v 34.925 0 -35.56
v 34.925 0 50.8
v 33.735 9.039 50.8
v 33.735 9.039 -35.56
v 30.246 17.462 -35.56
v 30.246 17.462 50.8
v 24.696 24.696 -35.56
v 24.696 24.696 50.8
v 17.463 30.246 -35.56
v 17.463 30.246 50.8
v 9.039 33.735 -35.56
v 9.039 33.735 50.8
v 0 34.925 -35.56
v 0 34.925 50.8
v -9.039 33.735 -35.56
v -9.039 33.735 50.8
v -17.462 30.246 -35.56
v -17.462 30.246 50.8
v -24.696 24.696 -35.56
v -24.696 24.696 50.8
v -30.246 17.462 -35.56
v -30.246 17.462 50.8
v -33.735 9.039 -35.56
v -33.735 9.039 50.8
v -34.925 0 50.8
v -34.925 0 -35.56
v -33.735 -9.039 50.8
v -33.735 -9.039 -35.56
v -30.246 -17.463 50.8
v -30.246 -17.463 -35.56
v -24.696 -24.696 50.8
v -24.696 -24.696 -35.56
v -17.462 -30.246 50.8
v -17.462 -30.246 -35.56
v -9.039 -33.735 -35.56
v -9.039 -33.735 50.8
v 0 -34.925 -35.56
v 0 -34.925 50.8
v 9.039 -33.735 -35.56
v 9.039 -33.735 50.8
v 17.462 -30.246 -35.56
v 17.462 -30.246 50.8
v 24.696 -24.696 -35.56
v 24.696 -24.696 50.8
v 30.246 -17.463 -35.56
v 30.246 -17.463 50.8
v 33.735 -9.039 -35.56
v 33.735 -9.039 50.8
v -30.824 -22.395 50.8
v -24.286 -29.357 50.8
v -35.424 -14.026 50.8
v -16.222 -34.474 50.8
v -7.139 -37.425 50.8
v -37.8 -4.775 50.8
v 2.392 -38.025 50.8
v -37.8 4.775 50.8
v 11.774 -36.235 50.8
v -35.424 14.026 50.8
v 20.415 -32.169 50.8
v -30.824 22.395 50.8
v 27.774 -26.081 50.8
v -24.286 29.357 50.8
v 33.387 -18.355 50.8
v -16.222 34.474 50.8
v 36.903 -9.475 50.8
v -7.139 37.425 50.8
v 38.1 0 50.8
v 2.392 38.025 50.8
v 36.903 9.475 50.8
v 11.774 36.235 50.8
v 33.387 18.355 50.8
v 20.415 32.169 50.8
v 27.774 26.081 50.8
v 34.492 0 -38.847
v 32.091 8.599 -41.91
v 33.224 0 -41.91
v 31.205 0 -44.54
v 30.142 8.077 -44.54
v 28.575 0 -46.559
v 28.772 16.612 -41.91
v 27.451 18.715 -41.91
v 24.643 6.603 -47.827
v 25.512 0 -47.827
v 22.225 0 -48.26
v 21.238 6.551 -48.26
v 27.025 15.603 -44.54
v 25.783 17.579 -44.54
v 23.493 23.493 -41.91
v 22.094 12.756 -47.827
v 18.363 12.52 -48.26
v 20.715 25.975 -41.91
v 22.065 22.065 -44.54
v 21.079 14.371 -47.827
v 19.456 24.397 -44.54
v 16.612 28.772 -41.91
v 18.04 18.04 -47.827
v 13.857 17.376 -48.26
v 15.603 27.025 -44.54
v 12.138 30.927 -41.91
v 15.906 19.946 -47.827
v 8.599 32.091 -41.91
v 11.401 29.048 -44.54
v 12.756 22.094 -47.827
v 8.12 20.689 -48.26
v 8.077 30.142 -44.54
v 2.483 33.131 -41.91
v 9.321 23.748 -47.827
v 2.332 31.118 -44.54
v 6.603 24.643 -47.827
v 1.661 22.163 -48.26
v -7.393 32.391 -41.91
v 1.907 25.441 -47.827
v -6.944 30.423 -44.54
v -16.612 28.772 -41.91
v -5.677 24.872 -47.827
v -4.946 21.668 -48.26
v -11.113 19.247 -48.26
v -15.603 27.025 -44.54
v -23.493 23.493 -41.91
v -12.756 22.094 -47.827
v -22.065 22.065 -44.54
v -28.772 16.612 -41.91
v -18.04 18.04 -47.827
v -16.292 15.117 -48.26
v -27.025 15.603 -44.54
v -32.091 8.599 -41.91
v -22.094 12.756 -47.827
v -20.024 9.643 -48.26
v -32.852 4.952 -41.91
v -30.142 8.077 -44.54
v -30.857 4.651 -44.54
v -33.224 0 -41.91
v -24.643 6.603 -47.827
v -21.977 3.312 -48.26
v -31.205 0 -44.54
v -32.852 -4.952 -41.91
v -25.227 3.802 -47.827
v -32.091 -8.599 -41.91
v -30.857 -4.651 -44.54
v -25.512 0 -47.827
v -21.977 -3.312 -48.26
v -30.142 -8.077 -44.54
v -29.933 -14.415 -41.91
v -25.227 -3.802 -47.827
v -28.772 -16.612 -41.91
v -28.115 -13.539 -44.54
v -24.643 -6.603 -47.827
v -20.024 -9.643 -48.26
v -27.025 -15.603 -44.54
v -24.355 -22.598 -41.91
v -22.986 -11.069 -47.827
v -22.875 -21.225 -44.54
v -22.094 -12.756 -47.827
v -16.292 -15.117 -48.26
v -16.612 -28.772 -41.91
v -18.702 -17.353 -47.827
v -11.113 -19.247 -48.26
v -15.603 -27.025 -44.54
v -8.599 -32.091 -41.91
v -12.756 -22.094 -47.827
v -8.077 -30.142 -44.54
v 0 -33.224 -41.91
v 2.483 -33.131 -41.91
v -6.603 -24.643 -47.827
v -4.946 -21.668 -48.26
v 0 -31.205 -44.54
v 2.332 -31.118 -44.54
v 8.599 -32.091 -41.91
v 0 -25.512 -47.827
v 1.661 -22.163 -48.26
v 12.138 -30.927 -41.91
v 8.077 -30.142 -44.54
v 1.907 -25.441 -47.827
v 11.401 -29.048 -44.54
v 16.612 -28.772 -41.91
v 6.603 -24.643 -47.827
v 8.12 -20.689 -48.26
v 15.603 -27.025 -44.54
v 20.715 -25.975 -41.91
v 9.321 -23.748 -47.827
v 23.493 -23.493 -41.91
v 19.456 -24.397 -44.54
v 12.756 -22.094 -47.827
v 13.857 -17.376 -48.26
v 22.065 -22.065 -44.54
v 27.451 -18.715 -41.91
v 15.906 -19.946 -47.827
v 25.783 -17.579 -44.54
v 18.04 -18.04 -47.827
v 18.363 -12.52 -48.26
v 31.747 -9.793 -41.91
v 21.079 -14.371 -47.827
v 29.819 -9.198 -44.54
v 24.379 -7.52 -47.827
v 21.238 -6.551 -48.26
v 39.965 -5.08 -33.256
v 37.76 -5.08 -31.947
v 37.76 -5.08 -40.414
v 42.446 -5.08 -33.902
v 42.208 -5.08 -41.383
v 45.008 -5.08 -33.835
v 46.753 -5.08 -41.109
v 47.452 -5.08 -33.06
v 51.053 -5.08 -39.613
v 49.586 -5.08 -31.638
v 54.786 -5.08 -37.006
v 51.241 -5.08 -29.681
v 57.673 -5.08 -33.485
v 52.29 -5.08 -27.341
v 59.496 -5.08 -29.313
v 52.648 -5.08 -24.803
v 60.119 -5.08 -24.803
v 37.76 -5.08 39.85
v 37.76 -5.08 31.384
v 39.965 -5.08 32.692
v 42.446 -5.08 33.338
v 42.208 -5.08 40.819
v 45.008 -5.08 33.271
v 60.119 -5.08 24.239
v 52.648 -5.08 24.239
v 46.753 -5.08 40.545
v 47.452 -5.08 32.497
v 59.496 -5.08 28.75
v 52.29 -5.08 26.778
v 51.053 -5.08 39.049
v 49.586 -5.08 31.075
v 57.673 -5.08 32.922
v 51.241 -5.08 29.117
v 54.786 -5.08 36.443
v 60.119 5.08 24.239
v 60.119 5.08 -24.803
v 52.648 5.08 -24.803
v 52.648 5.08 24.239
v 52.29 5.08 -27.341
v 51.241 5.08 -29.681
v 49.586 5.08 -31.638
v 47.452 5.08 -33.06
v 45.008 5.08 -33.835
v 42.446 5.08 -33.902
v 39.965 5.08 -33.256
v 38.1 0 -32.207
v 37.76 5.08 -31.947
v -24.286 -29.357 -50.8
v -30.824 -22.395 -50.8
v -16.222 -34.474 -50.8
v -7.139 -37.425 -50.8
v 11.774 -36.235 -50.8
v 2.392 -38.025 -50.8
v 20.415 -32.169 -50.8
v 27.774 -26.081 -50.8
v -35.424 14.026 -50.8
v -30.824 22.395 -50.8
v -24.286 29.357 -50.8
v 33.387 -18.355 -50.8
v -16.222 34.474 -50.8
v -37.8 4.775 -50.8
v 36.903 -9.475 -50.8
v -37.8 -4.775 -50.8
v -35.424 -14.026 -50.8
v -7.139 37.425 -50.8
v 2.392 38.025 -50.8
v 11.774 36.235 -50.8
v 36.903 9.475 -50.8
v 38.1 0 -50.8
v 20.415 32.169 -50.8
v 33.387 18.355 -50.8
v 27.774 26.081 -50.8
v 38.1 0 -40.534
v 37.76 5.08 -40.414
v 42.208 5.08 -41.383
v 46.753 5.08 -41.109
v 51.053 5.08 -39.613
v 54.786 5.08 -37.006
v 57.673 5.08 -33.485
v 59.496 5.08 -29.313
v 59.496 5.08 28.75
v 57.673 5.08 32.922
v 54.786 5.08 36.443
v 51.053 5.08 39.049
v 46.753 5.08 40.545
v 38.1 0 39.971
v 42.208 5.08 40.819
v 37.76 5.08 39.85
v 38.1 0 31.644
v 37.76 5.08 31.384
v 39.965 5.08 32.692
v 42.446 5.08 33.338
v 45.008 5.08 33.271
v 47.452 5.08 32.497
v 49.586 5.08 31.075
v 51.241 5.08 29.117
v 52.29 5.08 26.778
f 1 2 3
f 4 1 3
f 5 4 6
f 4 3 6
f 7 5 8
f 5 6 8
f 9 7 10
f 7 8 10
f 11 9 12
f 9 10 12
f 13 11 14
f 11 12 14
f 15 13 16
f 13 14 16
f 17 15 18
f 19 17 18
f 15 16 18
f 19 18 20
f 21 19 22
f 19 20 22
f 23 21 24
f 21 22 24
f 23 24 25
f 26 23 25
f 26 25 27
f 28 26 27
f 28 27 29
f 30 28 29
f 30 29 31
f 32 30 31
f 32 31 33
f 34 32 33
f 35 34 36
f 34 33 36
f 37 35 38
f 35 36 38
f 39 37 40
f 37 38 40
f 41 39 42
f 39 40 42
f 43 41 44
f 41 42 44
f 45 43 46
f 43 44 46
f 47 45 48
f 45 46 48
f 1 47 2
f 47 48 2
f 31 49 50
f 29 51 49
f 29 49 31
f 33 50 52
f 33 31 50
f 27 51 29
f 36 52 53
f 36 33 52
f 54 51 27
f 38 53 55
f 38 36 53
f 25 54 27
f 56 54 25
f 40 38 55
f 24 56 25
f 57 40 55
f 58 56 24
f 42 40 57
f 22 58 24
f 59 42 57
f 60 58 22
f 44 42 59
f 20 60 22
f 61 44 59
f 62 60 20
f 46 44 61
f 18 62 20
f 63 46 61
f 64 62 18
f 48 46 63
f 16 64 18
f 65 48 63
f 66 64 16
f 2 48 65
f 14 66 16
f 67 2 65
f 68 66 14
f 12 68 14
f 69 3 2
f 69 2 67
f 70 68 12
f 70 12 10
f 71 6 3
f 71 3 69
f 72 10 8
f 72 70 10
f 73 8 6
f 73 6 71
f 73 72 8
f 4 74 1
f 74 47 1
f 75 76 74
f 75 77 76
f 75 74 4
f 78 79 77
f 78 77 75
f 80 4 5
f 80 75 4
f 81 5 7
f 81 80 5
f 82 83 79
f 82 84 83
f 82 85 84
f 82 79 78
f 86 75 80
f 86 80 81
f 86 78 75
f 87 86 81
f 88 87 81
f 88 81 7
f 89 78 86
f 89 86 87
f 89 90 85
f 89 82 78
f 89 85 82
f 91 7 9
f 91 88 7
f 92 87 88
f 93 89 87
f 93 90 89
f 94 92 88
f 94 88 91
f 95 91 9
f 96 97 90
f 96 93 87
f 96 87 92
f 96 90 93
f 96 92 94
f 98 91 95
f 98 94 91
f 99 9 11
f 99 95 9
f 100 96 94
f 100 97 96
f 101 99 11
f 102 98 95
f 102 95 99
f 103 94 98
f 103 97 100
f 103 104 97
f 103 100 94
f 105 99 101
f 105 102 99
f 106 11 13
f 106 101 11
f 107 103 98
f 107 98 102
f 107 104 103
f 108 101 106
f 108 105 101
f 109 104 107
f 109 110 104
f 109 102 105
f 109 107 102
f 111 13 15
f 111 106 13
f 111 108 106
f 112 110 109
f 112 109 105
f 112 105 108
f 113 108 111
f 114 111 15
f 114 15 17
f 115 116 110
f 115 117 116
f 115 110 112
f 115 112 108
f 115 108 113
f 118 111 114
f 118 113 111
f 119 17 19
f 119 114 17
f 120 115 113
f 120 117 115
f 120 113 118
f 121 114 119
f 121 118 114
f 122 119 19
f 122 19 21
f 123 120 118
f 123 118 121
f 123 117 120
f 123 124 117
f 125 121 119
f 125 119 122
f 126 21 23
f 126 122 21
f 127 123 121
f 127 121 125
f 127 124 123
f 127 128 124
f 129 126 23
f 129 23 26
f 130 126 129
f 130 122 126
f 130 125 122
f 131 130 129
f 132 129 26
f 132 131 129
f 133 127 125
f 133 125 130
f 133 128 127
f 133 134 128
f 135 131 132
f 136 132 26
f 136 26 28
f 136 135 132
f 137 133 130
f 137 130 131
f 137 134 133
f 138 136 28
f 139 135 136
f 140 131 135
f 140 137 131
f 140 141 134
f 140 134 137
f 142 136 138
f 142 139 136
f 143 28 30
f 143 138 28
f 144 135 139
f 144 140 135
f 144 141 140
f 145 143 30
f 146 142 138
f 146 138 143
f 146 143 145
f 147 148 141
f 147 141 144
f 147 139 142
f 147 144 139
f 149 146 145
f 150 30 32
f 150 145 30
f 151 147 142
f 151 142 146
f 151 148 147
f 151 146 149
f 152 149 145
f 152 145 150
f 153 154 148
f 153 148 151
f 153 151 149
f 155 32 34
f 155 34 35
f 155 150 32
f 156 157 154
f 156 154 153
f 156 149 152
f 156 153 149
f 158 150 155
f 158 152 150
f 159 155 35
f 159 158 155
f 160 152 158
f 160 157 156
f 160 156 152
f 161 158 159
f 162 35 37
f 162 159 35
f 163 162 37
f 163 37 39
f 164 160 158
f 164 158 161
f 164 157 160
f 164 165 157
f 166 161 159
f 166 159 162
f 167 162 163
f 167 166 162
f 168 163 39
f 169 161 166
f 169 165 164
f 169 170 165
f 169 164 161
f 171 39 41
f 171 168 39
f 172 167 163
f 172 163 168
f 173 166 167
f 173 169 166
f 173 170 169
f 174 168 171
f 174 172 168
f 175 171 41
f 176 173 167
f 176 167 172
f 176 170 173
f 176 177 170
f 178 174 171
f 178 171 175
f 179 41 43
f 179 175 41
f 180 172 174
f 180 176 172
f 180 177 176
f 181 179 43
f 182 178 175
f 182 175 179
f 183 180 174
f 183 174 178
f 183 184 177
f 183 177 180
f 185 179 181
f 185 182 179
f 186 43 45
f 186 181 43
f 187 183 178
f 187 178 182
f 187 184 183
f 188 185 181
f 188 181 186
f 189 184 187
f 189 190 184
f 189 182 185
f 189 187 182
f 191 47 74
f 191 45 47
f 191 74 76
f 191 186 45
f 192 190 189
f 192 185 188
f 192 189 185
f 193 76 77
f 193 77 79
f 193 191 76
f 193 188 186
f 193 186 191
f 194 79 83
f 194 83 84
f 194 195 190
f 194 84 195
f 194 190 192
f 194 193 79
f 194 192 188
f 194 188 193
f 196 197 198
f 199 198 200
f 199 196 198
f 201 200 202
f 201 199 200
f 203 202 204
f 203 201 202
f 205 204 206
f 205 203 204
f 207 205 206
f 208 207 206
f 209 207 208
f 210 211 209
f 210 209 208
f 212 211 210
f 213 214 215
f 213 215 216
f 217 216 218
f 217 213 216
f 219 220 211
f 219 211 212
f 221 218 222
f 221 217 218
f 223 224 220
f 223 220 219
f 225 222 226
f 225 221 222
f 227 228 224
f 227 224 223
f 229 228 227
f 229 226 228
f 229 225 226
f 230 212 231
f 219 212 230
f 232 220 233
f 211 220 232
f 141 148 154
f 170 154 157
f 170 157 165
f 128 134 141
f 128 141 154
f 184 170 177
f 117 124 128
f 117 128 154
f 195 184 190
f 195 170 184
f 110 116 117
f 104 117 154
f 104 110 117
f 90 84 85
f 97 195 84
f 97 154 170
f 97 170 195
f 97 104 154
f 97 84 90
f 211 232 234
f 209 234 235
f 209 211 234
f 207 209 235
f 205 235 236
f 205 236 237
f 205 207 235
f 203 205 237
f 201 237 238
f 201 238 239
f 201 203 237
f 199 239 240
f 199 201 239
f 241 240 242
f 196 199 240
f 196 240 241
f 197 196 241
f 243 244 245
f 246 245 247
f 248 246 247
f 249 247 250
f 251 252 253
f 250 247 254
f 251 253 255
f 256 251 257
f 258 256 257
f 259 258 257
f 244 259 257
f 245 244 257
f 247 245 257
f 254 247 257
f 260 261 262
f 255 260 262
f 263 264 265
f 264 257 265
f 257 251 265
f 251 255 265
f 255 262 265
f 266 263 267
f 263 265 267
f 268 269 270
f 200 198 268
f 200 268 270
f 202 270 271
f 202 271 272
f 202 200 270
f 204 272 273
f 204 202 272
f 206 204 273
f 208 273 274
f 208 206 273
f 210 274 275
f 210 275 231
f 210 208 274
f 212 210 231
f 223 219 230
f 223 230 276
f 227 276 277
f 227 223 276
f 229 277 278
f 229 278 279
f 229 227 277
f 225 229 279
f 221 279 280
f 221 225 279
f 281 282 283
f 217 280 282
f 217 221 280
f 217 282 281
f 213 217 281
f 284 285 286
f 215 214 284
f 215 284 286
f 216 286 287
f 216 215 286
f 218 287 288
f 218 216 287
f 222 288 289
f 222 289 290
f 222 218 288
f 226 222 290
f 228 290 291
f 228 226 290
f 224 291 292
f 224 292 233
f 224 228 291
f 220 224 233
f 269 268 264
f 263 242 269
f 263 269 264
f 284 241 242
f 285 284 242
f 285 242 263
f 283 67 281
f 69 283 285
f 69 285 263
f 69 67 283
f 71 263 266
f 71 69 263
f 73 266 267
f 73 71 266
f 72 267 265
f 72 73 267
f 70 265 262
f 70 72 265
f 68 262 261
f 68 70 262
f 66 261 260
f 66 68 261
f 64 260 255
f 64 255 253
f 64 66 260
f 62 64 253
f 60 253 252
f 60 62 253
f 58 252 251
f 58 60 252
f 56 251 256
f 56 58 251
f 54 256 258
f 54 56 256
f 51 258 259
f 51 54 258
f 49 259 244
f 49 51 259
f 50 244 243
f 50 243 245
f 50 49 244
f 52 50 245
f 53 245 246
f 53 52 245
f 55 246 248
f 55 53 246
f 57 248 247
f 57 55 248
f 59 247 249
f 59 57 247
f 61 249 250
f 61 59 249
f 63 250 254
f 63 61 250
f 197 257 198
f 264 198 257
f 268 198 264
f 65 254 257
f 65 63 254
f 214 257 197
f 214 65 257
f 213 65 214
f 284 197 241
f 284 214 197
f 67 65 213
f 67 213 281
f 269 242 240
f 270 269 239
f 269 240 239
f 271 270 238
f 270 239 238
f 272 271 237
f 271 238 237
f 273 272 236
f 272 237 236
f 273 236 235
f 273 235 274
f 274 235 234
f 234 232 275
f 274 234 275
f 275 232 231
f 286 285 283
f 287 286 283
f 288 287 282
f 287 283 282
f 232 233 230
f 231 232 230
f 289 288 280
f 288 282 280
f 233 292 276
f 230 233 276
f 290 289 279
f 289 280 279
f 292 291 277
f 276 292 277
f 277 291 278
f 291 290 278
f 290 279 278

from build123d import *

# Parameters (mm, degrees)
F0_R          = 38.1
F1_DEPTH      = 50.8
F1_DEPTH_BACK = 50.8
F2_R          = 34.925
F3_DEPTH      = 99.06
F5_DEPTH      = 5.08
F5_DEPTH_BACK = 5.08
F6_R          = 12.7


with BuildPart() as f1:
    # F0 (on Top) → F1 (new body, two sides)
    with BuildSketch(Plane.XY) as f1_sk:
        Circle(F0_R)
    extrude(amount=F1_DEPTH)
    extrude(f1_sk.sketch, amount=-F1_DEPTH_BACK)

    # F2 (on face) → F3 (cut)
    with BuildSketch(Plane.XY.offset(50.8)):
        Circle(F2_R)
    extrude(amount=-F3_DEPTH, mode=Mode.SUBTRACT)

    # F4 (on Front) → F5 (join, two sides)
    with BuildSketch(Plane.XZ) as f5_sk:
        with BuildLine():
            Line((60.119201, -24.80282), (60.119201, 24.239462))
            ThreePointArc((60.119201, 24.239462), (52.108585, 38.460985), (35.794442, 38.981002))
            Line((35.794442, 38.981002), (35.794442, 29.205198))
            ThreePointArc((35.794442, 29.205198), (46.078305, 33.024621), (52.648449, 24.239462))
            Line((52.648449, 24.239462), (52.648449, -24.80282))
            ThreePointArc((52.648449, -24.80282), (46.078305, -33.58798), (35.794442, -29.768556))
            Line((35.794442, -29.768556), (35.794442, -39.54436))
            ThreePointArc((35.794442, -39.54436), (52.108585, -39.024344), (60.119201, -24.80282))
        make_face()
    extrude(amount=F5_DEPTH)
    extrude(f5_sk.sketch, amount=-F5_DEPTH_BACK)

    # F6
    f6_edges = [f1.edges().sort_by_distance(p)[0] for p in [
        (-34.925, 0, -48.26),
    ]]
    fillet(f6_edges, radius=F6_R)


solid = f1.part
